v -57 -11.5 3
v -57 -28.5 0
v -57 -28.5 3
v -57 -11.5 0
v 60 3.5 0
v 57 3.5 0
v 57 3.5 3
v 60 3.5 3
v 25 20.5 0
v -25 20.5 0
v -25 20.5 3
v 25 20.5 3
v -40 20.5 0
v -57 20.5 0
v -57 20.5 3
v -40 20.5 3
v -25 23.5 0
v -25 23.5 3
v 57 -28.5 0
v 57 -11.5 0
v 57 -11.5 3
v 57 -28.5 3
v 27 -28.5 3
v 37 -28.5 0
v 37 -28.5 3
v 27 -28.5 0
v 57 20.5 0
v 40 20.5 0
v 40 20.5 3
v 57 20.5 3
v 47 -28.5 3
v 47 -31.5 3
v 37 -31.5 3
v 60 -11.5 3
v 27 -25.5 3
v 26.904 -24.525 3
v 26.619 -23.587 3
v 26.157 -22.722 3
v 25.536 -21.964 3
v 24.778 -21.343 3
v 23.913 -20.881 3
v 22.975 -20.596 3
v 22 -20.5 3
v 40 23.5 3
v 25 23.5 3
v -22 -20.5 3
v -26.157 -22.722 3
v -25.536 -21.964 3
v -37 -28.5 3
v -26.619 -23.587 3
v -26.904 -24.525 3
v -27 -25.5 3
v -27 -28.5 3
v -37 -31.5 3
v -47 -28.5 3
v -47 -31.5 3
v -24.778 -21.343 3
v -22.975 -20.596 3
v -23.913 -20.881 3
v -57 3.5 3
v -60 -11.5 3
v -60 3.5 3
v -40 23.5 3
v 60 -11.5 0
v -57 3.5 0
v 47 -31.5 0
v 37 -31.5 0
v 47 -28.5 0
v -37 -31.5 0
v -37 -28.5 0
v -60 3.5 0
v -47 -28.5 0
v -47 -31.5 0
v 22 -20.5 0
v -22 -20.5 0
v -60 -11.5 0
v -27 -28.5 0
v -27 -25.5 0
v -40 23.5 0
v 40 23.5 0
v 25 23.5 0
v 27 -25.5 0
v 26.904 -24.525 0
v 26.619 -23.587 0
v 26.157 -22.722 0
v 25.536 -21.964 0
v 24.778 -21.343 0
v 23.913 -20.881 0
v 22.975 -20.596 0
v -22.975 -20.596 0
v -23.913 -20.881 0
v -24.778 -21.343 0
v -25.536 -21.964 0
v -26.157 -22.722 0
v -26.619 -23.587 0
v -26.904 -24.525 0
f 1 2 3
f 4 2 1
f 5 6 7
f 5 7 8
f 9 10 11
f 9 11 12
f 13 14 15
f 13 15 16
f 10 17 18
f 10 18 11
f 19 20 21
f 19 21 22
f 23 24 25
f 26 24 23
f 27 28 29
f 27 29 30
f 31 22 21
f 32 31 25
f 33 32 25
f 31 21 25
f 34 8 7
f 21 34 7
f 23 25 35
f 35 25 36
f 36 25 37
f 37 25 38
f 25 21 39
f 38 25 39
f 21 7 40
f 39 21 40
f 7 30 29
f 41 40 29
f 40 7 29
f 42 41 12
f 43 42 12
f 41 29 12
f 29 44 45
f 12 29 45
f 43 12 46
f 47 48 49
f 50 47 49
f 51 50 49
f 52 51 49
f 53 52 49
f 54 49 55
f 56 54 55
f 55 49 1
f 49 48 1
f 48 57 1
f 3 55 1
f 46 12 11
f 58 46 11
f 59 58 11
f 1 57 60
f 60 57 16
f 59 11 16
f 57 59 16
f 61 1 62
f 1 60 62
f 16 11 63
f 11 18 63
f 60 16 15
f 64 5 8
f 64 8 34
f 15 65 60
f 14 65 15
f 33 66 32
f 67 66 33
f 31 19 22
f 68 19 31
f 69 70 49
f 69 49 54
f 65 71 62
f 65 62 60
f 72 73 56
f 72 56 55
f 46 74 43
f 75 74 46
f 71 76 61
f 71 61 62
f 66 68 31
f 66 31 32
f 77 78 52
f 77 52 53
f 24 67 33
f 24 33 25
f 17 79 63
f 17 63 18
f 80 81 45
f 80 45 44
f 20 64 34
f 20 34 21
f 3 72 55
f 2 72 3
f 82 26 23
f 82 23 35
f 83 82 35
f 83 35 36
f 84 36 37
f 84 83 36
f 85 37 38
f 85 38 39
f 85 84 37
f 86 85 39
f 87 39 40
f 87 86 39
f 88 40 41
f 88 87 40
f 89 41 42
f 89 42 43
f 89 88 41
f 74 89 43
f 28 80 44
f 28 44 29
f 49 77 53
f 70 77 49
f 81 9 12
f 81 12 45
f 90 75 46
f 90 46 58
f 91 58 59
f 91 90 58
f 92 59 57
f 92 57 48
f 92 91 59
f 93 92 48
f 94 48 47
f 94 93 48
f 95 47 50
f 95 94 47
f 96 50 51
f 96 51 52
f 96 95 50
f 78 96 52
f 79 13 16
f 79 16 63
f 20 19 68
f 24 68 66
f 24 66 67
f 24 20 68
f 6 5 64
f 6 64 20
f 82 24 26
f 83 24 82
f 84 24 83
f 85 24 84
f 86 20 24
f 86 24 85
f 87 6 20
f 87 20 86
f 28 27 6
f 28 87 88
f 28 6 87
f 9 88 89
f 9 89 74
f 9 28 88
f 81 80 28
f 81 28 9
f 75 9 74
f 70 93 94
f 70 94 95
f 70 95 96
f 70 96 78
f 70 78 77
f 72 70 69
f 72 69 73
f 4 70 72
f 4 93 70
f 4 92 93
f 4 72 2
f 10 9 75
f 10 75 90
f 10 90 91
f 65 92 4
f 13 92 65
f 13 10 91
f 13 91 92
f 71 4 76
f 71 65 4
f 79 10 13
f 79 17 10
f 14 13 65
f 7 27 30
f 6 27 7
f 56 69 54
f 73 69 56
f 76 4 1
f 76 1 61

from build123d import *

# Parameters (mm, degrees)
BOSS_EXTRUDE1_DEPTH = 3


with BuildPart() as part:
    # Sketch1 → Boss-Extrude1 (new body)
    with BuildSketch(Plane.XY):
        with BuildLine():
            Line((-57, -28.5), (-57, -11.5))
            Line((-57, -11.5), (-60, -11.5))
            Line((-60, -11.5), (-60, 3.5))
            Line((-60, 3.5), (-57, 3.5))
            Line((-57, 3.5), (-57, 20.5))
            Line((-57, 20.5), (-40, 20.5))
            Line((-40, 20.5), (-40, 23.5))
            Line((-40, 23.5), (-25, 23.5))
            Line((-25, 23.5), (-25, 20.5))
            Line((-25, 20.5), (25, 20.5))
            Line((25, 20.5), (25, 23.5))
            Line((25, 23.5), (40, 23.5))
            Line((40, 23.5), (40, 20.5))
            Line((40, 20.5), (57, 20.5))
            Line((57, 20.5), (57, 3.5))
            Line((57, 3.5), (60, 3.5))
            Line((60, 3.5), (60, -11.5))
            Line((60, -11.5), (57, -11.5))
            Line((57, -11.5), (57, -28.5))
            Line((57, -28.5), (47, -28.5))
            Line((47, -28.5), (47, -31.5))
            Line((47, -31.5), (37, -31.5))
            Line((37, -31.5), (37, -28.5))
            Line((37, -28.5), (27, -28.5))
            Line((27, -28.5), (27, -25.5))
            ThreePointArc((27, -25.5), (25.535533906, -21.964466094), (22, -20.5))
            Line((22, -20.5), (-22, -20.5))
            ThreePointArc((-22, -20.5), (-25.535533906, -21.964466094), (-27, -25.5))
            Line((-27, -25.5), (-27, -28.5))
            Line((-27, -28.5), (-37, -28.5))
            Line((-37, -28.5), (-37, -31.5))
            Line((-37, -31.5), (-47, -31.5))
            Line((-47, -31.5), (-47, -28.5))
            Line((-47, -28.5), (-57, -28.5))
        make_face()
    extrude(amount=BOSS_EXTRUDE1_DEPTH)


solid = part.part
